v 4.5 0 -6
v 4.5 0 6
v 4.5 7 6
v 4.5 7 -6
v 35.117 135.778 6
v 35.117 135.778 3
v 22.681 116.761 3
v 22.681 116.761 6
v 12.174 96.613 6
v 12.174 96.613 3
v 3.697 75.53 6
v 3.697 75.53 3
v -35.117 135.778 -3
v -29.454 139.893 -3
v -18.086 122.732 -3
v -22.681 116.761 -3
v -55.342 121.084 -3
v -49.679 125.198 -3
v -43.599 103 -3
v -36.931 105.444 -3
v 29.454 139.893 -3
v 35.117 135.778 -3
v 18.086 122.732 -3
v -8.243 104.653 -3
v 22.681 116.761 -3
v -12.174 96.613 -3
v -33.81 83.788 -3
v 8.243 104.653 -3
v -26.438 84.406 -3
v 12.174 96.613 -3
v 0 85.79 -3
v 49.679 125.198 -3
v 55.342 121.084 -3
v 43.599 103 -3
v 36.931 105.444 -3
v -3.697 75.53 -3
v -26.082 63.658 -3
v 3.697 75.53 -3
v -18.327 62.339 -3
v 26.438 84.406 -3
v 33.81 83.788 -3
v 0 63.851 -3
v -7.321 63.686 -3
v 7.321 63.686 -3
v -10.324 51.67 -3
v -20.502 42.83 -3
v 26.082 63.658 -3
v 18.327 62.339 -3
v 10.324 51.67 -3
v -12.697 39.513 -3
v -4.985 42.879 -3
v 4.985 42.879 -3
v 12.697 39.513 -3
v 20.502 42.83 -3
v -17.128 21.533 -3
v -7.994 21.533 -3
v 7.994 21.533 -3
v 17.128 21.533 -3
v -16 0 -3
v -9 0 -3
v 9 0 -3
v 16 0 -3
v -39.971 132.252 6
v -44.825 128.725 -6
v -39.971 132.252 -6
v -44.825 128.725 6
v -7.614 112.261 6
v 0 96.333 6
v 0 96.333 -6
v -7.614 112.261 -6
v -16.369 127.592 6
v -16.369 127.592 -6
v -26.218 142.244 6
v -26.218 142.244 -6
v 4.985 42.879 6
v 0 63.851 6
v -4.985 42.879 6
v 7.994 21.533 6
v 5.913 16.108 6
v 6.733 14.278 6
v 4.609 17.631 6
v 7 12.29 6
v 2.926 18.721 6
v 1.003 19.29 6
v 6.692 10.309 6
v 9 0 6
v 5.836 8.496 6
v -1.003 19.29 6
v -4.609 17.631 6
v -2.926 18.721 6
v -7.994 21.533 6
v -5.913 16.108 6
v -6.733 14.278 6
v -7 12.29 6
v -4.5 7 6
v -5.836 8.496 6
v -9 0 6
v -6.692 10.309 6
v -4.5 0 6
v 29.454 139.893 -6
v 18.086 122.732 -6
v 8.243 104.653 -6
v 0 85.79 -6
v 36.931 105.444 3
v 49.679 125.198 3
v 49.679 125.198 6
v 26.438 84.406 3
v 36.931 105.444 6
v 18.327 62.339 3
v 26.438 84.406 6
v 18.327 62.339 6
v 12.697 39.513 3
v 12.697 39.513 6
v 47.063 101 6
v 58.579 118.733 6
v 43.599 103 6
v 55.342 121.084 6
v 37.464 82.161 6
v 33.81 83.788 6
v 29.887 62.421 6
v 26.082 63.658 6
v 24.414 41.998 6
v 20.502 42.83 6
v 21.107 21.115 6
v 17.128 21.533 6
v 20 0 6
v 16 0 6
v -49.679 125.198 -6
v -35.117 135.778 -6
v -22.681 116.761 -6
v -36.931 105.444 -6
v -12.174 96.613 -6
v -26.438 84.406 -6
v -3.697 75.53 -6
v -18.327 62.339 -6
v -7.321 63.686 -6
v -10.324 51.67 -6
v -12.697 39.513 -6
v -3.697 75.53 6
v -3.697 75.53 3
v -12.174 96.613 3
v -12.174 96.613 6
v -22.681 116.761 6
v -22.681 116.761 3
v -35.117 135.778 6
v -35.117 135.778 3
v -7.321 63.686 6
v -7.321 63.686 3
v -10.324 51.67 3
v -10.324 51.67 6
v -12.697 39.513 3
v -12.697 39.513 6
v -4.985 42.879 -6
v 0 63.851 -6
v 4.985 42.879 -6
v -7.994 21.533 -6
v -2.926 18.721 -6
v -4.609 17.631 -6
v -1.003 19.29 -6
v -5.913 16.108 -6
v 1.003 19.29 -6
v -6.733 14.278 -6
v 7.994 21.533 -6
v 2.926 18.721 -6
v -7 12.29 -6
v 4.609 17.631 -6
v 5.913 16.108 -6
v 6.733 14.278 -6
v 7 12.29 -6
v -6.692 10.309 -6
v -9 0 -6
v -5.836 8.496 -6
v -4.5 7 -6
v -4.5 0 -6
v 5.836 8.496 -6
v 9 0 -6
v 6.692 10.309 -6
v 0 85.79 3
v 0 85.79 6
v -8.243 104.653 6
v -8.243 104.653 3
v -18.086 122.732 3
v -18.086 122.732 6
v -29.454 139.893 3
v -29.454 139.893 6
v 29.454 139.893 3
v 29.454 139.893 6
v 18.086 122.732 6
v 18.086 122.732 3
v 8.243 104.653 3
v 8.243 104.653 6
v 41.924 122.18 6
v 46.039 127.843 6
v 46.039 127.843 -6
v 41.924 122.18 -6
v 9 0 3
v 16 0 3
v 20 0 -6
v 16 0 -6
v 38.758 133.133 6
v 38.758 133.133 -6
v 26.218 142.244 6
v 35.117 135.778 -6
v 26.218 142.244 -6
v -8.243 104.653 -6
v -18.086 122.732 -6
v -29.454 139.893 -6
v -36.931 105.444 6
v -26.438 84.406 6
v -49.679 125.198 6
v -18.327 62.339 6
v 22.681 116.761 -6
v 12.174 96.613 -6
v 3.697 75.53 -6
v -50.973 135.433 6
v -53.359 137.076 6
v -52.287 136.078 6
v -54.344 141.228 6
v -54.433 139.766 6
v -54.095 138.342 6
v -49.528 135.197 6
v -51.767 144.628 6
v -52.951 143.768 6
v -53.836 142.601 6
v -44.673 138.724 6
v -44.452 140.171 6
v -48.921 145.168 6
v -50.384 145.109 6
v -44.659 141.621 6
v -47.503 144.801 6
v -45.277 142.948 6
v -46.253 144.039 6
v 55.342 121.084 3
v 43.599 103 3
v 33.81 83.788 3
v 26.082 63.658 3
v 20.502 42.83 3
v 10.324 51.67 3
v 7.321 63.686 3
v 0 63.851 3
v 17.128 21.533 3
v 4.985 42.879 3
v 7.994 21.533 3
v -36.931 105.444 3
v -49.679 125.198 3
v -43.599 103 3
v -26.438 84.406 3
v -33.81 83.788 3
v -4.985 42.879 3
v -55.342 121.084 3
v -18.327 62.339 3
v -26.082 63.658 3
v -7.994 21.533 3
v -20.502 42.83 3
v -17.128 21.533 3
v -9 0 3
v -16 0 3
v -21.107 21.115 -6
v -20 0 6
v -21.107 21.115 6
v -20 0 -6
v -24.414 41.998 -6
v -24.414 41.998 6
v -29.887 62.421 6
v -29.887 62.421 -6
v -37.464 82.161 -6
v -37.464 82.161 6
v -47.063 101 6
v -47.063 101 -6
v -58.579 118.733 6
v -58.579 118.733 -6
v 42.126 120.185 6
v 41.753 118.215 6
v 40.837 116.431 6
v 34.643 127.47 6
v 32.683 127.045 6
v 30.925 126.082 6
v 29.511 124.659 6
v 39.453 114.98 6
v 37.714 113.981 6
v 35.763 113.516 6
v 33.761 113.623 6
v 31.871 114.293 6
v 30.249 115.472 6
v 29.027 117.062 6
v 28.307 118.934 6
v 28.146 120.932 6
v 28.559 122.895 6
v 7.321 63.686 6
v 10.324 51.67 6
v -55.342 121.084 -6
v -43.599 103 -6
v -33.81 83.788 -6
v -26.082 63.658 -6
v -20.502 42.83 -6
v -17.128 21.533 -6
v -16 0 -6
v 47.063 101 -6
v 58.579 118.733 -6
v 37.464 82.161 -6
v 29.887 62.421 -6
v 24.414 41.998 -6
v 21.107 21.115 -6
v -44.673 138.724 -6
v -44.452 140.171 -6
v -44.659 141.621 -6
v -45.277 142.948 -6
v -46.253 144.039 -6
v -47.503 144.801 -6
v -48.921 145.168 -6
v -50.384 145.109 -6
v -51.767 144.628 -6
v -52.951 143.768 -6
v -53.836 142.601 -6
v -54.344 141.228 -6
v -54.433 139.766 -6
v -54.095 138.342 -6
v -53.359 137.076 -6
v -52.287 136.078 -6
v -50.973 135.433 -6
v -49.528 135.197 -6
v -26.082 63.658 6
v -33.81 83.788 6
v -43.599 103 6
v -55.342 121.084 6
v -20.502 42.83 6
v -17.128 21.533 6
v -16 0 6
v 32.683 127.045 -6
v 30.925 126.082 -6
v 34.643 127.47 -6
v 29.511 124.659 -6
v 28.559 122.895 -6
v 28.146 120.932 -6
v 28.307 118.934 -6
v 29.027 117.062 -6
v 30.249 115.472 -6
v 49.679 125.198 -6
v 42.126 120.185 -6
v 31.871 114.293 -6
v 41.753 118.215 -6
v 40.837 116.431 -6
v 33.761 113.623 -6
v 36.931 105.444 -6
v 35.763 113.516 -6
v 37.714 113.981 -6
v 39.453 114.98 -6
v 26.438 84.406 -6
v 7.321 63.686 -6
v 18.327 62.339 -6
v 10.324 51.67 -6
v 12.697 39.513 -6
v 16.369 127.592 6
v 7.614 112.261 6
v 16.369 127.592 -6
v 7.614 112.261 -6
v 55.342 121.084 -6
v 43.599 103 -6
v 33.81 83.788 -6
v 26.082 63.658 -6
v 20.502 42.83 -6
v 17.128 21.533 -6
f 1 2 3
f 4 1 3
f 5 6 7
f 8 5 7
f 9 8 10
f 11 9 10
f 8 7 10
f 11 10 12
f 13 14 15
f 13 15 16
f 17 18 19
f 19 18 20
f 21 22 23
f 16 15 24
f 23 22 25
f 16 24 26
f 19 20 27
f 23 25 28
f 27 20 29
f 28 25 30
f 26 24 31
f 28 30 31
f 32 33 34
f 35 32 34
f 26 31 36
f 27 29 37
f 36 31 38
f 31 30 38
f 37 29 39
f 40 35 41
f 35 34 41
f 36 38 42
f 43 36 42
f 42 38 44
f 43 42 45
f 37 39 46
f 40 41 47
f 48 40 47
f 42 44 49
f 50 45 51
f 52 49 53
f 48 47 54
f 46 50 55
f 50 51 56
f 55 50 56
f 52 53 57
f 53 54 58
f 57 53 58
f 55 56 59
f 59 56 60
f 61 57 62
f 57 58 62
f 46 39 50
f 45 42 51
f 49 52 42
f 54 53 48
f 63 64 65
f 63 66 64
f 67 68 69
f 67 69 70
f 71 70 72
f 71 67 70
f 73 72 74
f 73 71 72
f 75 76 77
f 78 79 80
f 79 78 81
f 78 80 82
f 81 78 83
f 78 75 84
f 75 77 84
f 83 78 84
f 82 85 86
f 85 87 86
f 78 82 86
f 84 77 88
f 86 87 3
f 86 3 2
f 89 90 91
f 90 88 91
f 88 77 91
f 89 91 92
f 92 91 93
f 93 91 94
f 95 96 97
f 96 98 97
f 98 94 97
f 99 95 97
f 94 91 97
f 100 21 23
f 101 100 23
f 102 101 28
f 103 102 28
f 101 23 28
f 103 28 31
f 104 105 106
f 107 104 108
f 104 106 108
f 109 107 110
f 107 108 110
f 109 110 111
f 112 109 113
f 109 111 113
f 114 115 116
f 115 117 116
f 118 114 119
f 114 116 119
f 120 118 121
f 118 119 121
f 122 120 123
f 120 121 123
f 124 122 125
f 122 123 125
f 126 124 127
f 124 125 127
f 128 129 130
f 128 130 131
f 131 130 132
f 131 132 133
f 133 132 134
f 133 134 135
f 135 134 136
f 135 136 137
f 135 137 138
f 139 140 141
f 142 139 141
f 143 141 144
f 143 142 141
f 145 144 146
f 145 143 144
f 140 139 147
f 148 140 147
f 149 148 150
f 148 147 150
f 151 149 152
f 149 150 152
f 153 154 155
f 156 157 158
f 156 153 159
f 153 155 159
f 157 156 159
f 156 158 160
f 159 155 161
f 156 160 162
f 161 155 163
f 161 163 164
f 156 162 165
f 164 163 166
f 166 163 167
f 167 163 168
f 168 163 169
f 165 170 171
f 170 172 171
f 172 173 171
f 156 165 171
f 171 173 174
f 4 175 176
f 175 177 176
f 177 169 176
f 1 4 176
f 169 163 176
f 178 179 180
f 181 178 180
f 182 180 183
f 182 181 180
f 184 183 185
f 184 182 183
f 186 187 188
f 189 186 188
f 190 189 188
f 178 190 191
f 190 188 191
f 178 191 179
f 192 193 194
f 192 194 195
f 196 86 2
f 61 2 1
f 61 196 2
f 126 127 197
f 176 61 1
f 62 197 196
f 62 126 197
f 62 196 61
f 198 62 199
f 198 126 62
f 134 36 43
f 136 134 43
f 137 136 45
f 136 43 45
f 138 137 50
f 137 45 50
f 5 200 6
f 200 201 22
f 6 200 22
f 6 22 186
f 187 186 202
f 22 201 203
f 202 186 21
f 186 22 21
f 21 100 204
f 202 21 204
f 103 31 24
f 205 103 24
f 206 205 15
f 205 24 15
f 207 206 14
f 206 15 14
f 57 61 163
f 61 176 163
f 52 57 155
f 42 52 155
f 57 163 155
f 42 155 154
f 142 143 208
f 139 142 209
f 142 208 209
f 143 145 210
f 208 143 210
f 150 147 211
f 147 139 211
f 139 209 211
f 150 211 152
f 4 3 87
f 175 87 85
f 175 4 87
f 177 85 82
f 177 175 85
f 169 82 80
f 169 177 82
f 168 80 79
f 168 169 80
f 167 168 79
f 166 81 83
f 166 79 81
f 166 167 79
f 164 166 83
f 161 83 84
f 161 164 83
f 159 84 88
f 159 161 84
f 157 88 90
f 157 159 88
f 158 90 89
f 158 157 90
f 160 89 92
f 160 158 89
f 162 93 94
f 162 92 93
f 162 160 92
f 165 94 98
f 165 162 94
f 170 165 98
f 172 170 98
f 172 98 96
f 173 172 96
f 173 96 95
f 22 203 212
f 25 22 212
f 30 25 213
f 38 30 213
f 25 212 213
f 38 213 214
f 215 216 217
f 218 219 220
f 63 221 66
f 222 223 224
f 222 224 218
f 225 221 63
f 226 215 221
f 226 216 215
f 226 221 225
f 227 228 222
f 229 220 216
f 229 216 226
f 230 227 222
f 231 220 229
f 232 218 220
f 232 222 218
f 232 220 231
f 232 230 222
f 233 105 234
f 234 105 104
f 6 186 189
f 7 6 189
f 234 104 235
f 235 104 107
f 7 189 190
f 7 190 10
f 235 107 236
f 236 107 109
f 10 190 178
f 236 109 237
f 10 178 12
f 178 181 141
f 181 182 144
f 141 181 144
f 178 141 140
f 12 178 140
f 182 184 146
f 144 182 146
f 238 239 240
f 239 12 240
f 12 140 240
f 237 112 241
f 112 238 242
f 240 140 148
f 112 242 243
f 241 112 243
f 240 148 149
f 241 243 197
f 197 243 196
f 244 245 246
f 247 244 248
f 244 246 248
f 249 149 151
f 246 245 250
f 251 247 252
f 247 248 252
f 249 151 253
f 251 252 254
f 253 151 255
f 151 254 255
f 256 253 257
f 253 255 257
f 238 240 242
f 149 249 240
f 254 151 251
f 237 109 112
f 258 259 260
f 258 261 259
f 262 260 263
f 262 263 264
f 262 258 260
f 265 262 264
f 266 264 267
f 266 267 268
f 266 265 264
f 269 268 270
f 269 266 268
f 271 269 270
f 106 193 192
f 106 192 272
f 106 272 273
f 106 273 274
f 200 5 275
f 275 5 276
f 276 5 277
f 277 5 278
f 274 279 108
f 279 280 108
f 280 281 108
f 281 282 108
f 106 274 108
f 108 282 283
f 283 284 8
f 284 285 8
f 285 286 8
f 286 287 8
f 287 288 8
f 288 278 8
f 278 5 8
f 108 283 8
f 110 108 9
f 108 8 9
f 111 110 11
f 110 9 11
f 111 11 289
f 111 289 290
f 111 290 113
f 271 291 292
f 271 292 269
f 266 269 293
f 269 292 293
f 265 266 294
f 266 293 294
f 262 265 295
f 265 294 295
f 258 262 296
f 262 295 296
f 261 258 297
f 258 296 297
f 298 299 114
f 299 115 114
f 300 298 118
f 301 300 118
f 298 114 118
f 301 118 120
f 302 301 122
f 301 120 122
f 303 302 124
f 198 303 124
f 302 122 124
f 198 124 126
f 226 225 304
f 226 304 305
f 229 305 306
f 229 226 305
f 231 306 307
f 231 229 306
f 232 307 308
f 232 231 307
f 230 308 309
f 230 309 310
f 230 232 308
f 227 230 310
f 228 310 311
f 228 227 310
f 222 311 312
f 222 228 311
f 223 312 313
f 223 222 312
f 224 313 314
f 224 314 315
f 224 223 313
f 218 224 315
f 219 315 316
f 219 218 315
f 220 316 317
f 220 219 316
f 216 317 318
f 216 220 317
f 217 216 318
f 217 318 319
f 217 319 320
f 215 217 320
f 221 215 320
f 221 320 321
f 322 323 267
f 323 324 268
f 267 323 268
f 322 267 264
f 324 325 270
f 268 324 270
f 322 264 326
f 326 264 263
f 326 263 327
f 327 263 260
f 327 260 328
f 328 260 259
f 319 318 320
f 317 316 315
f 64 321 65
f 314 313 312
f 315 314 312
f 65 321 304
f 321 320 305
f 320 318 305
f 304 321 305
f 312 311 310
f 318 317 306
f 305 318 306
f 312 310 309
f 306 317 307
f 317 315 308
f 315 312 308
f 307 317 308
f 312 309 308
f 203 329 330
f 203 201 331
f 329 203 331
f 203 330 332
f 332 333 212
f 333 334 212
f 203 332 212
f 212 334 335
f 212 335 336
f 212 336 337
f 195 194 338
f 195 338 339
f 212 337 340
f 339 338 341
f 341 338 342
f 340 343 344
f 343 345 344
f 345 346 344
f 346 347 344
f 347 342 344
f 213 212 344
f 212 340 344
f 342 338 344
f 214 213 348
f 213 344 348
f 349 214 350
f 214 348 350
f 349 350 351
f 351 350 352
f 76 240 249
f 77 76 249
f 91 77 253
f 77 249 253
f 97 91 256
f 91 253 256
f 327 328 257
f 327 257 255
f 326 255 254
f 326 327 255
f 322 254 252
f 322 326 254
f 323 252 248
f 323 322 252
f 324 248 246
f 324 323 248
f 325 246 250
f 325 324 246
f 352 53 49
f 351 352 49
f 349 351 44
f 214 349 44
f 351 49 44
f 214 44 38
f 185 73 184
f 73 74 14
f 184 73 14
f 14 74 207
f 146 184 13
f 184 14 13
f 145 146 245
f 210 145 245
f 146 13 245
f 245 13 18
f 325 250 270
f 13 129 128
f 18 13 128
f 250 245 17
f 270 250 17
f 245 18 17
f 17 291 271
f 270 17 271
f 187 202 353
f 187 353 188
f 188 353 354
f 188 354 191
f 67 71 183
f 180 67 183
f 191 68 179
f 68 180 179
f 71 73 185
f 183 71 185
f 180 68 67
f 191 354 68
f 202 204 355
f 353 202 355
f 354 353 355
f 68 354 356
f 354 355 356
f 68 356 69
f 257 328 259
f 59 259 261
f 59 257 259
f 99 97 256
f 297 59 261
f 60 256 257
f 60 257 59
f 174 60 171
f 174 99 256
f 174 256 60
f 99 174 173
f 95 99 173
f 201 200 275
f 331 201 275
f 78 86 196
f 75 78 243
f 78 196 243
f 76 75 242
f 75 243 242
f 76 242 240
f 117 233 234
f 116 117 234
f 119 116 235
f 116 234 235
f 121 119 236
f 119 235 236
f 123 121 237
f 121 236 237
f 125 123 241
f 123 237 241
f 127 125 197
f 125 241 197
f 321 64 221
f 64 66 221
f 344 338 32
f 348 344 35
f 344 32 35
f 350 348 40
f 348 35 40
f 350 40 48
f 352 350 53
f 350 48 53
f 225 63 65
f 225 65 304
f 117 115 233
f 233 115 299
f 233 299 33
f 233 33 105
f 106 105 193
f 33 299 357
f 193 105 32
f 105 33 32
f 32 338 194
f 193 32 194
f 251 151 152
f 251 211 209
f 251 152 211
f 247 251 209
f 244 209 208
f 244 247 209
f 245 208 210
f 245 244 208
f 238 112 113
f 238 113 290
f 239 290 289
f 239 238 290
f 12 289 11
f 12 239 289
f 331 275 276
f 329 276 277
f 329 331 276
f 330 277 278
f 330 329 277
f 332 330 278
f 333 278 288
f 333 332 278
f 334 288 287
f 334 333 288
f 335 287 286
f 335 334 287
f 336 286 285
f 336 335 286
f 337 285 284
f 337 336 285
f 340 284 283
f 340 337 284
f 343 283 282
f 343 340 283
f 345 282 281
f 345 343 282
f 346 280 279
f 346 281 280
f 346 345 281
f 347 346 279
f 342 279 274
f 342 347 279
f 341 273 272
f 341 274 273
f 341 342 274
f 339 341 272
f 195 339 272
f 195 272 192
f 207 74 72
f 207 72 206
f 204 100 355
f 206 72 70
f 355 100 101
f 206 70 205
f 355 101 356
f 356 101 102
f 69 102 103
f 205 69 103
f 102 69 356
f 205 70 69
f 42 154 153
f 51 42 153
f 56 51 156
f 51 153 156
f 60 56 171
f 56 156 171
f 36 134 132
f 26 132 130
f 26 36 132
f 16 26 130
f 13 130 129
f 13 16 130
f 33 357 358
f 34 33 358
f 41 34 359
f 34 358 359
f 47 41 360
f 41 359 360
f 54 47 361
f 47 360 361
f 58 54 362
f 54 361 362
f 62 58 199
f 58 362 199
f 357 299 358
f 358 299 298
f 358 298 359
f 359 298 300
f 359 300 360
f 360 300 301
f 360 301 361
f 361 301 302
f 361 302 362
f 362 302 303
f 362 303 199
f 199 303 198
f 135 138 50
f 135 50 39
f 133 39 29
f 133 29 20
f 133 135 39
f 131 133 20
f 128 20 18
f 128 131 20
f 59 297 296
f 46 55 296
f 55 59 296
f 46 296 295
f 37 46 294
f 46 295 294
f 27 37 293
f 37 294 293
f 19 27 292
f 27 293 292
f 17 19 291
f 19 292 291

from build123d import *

# Parameters (mm, degrees)
SKETCH003_W          = 7
SKETCH003_H          = 3
SKETCH004_W          = 7
SKETCH004_H          = 3
SKETCH005_W          = 7
SKETCH005_H          = 3
SKETCH006_W          = 7
SKETCH006_H          = 3
POCKET_DEPTH         = 6.001
POCKET_DEPTH_BACK    = -6.001
POCKET001_DEPTH      = 6.001
POCKET001_DEPTH_BACK = -6.001
PAD002_DEPTH         = 6


with BuildPart() as main:
    # AdditivePipe: sweep along a path in Sketch
    with BuildLine(Plane.XY) as additivepipe_path:
        ThreePointArc((0, 0), (-10.865453, 68.601773), (-42.398227, 130.488326))
    # Sketch002 → AdditivePipe (sweep)
    with BuildSketch(Plane.XZ):
        Polygon((-20, 6), (-20, -6), (-16, -6), (-16, -3), (-9, -3), (-9, -6), (9, -6), (9, -3), (16, -3), (16, -6), (20, -6), (20, 6), (16, 6), (16, 3), (9, 3), (9, 6), (-9, 6), (-9, 3), (-16, 3), (-16, 6), align=None)
    sweep(path=additivepipe_path.line)

    # AdditivePipe001: sweep along a path in Sketch001
    with BuildLine(Plane.XY) as additivepipe001_path:
        ThreePointArc((42.398227, 130.488326), (10.865453, 68.601773), (0, 0))
    # Sketch002 → AdditivePipe001 (sweep)
    with BuildSketch(Plane.XZ):
        Polygon((-20, 6), (-20, -6), (-16, -6), (-16, -3), (-9, -3), (-9, -6), (9, -6), (9, -3), (16, -3), (16, -6), (20, -6), (20, 6), (16, 6), (16, 3), (9, 3), (9, 6), (-9, 6), (-9, 3), (-16, 3), (-16, 6), align=None)
    sweep(path=additivepipe001_path.line)

    # SubtractivePipe: sweep along a path in Sketch
    with BuildLine(Plane.XY) as subtractivepipe_path:
        ThreePointArc((0, 0), (-10.865453, 68.601773), (-42.398227, 130.488326))
    # Sketch003 → SubtractivePipe (sweep, cut)
    with BuildSketch(Plane.XZ):
        with Locations((-12.5, 4.5)):
            Rectangle(SKETCH003_W, SKETCH003_H)
    sweep(path=subtractivepipe_path.line, mode=Mode.SUBTRACT)

    # SubtractivePipe001: sweep along a path in Sketch001
    with BuildLine(Plane.XY) as subtractivepipe001_path:
        ThreePointArc((42.398227, 130.488326), (10.865453, 68.601773), (0, 0))
    # Sketch003 → SubtractivePipe001 (sweep, cut)
    with BuildSketch(Plane.XZ):
        with Locations((-12.5, 4.5)):
            Rectangle(SKETCH003_W, SKETCH003_H)
    sweep(path=subtractivepipe001_path.line, mode=Mode.SUBTRACT)

    # SubtractivePipe002: sweep along a path in Sketch
    with BuildLine(Plane.XY) as subtractivepipe002_path:
        ThreePointArc((0, 0), (-10.865453, 68.601773), (-42.398227, 130.488326))
    # Sketch004 → SubtractivePipe002 (sweep, cut)
    with BuildSketch(Plane.XZ):
        with Locations((12.5, 4.5)):
            Rectangle(SKETCH004_W, SKETCH004_H)
    sweep(path=subtractivepipe002_path.line, mode=Mode.SUBTRACT)

    # SubtractivePipe003: sweep along a path in Sketch001
    with BuildLine(Plane.XY) as subtractivepipe003_path:
        ThreePointArc((42.398227, 130.488326), (10.865453, 68.601773), (0, 0))
    # Sketch004 → SubtractivePipe003 (sweep, cut)
    with BuildSketch(Plane.XZ):
        with Locations((12.5, 4.5)):
            Rectangle(SKETCH004_W, SKETCH004_H)
    sweep(path=subtractivepipe003_path.line, mode=Mode.SUBTRACT)

    # SubtractivePipe004: sweep along a path in Sketch
    with BuildLine(Plane.XY) as subtractivepipe004_path:
        ThreePointArc((0, 0), (-10.865453, 68.601773), (-42.398227, 130.488326))
    # Sketch005 → SubtractivePipe004 (sweep, cut)
    with BuildSketch(Plane.XZ):
        with Locations((-12.5, -4.5)):
            Rectangle(SKETCH005_W, SKETCH005_H)
    sweep(path=subtractivepipe004_path.line, mode=Mode.SUBTRACT)

    # SubtractivePipe005: sweep along a path in Sketch001
    with BuildLine(Plane.XY) as subtractivepipe005_path:
        ThreePointArc((42.398227, 130.488326), (10.865453, 68.601773), (0, 0))
    # Sketch005 → SubtractivePipe005 (sweep, cut)
    with BuildSketch(Plane.XZ):
        with Locations((-12.5, -4.5)):
            Rectangle(SKETCH005_W, SKETCH005_H)
    sweep(path=subtractivepipe005_path.line, mode=Mode.SUBTRACT)

    # SubtractivePipe006: sweep along a path in Sketch
    with BuildLine(Plane.XY) as subtractivepipe006_path:
        ThreePointArc((0, 0), (-10.865453, 68.601773), (-42.398227, 130.488326))
    # Sketch006 → SubtractivePipe006 (sweep, cut)
    with BuildSketch(Plane.XZ):
        with Locations((12.5, -4.5)):
            Rectangle(SKETCH006_W, SKETCH006_H)
    sweep(path=subtractivepipe006_path.line, mode=Mode.SUBTRACT)

    # SubtractivePipe007: sweep along a path in Sketch001
    with BuildLine(Plane.XY) as subtractivepipe007_path:
        ThreePointArc((42.398227, 130.488326), (10.865453, 68.601773), (0, 0))
    # Sketch006 → SubtractivePipe007 (sweep, cut)
    with BuildSketch(Plane.XZ):
        with Locations((12.5, -4.5)):
            Rectangle(SKETCH006_W, SKETCH006_H)
    sweep(path=subtractivepipe007_path.line, mode=Mode.SUBTRACT)

    # Sketch007 → Pocket (cut, two sides)
    with BuildSketch(Plane.XY) as pocket_sk:
        with BuildLine():
            Line((-4.5, 0), (4.5, 0))
            Line((4.5, 0), (4.5, 7))
            ThreePointArc((4.5, 7), (0, 19.361903), (-4.5, 7))
            Line((-4.5, 0), (-4.5, 7))
        make_face()
    extrude(amount=-POCKET_DEPTH, mode=Mode.SUBTRACT)
    extrude(pocket_sk.sketch, amount=-POCKET_DEPTH_BACK, mode=Mode.SUBTRACT)

    # Sketch009 → Pocket001 (cut, two sides)
    with BuildSketch(Plane.XY) as pocket001_sk:
        with BuildLine():
            Line((38.757651, 133.13336), (46.038804, 127.843292))
            Line((46.038804, 127.843292), (41.924307, 122.180173))
            ThreePointArc((34.643154, 127.470241), (31.017586, 114.824218), (41.924307, 122.180173))
            Line((38.757651, 133.13336), (34.643154, 127.470241))
        make_face()
    extrude(amount=-POCKET001_DEPTH, mode=Mode.SUBTRACT)
    extrude(pocket001_sk.sketch, amount=-POCKET001_DEPTH_BACK, mode=Mode.SUBTRACT)


with BuildPart() as male2:
    # Sketch012 → Pad002 (new body, symmetric)
    with BuildSketch(Plane.XY):
        with BuildLine():
            Line((-44.825278, 128.72497), (-39.971176, 132.251682))
            Line((-39.971176, 132.251682), (-44.673458, 138.723818))
            ThreePointArc((-44.673458, 138.723818), (-52.390577, 144.241615), (-49.52756, 135.197106))
            Line((-44.825278, 128.72497), (-49.52756, 135.197106))
        make_face()
    extrude(amount=PAD002_DEPTH, both=True)


solid = Compound([main.part, male2.part])
